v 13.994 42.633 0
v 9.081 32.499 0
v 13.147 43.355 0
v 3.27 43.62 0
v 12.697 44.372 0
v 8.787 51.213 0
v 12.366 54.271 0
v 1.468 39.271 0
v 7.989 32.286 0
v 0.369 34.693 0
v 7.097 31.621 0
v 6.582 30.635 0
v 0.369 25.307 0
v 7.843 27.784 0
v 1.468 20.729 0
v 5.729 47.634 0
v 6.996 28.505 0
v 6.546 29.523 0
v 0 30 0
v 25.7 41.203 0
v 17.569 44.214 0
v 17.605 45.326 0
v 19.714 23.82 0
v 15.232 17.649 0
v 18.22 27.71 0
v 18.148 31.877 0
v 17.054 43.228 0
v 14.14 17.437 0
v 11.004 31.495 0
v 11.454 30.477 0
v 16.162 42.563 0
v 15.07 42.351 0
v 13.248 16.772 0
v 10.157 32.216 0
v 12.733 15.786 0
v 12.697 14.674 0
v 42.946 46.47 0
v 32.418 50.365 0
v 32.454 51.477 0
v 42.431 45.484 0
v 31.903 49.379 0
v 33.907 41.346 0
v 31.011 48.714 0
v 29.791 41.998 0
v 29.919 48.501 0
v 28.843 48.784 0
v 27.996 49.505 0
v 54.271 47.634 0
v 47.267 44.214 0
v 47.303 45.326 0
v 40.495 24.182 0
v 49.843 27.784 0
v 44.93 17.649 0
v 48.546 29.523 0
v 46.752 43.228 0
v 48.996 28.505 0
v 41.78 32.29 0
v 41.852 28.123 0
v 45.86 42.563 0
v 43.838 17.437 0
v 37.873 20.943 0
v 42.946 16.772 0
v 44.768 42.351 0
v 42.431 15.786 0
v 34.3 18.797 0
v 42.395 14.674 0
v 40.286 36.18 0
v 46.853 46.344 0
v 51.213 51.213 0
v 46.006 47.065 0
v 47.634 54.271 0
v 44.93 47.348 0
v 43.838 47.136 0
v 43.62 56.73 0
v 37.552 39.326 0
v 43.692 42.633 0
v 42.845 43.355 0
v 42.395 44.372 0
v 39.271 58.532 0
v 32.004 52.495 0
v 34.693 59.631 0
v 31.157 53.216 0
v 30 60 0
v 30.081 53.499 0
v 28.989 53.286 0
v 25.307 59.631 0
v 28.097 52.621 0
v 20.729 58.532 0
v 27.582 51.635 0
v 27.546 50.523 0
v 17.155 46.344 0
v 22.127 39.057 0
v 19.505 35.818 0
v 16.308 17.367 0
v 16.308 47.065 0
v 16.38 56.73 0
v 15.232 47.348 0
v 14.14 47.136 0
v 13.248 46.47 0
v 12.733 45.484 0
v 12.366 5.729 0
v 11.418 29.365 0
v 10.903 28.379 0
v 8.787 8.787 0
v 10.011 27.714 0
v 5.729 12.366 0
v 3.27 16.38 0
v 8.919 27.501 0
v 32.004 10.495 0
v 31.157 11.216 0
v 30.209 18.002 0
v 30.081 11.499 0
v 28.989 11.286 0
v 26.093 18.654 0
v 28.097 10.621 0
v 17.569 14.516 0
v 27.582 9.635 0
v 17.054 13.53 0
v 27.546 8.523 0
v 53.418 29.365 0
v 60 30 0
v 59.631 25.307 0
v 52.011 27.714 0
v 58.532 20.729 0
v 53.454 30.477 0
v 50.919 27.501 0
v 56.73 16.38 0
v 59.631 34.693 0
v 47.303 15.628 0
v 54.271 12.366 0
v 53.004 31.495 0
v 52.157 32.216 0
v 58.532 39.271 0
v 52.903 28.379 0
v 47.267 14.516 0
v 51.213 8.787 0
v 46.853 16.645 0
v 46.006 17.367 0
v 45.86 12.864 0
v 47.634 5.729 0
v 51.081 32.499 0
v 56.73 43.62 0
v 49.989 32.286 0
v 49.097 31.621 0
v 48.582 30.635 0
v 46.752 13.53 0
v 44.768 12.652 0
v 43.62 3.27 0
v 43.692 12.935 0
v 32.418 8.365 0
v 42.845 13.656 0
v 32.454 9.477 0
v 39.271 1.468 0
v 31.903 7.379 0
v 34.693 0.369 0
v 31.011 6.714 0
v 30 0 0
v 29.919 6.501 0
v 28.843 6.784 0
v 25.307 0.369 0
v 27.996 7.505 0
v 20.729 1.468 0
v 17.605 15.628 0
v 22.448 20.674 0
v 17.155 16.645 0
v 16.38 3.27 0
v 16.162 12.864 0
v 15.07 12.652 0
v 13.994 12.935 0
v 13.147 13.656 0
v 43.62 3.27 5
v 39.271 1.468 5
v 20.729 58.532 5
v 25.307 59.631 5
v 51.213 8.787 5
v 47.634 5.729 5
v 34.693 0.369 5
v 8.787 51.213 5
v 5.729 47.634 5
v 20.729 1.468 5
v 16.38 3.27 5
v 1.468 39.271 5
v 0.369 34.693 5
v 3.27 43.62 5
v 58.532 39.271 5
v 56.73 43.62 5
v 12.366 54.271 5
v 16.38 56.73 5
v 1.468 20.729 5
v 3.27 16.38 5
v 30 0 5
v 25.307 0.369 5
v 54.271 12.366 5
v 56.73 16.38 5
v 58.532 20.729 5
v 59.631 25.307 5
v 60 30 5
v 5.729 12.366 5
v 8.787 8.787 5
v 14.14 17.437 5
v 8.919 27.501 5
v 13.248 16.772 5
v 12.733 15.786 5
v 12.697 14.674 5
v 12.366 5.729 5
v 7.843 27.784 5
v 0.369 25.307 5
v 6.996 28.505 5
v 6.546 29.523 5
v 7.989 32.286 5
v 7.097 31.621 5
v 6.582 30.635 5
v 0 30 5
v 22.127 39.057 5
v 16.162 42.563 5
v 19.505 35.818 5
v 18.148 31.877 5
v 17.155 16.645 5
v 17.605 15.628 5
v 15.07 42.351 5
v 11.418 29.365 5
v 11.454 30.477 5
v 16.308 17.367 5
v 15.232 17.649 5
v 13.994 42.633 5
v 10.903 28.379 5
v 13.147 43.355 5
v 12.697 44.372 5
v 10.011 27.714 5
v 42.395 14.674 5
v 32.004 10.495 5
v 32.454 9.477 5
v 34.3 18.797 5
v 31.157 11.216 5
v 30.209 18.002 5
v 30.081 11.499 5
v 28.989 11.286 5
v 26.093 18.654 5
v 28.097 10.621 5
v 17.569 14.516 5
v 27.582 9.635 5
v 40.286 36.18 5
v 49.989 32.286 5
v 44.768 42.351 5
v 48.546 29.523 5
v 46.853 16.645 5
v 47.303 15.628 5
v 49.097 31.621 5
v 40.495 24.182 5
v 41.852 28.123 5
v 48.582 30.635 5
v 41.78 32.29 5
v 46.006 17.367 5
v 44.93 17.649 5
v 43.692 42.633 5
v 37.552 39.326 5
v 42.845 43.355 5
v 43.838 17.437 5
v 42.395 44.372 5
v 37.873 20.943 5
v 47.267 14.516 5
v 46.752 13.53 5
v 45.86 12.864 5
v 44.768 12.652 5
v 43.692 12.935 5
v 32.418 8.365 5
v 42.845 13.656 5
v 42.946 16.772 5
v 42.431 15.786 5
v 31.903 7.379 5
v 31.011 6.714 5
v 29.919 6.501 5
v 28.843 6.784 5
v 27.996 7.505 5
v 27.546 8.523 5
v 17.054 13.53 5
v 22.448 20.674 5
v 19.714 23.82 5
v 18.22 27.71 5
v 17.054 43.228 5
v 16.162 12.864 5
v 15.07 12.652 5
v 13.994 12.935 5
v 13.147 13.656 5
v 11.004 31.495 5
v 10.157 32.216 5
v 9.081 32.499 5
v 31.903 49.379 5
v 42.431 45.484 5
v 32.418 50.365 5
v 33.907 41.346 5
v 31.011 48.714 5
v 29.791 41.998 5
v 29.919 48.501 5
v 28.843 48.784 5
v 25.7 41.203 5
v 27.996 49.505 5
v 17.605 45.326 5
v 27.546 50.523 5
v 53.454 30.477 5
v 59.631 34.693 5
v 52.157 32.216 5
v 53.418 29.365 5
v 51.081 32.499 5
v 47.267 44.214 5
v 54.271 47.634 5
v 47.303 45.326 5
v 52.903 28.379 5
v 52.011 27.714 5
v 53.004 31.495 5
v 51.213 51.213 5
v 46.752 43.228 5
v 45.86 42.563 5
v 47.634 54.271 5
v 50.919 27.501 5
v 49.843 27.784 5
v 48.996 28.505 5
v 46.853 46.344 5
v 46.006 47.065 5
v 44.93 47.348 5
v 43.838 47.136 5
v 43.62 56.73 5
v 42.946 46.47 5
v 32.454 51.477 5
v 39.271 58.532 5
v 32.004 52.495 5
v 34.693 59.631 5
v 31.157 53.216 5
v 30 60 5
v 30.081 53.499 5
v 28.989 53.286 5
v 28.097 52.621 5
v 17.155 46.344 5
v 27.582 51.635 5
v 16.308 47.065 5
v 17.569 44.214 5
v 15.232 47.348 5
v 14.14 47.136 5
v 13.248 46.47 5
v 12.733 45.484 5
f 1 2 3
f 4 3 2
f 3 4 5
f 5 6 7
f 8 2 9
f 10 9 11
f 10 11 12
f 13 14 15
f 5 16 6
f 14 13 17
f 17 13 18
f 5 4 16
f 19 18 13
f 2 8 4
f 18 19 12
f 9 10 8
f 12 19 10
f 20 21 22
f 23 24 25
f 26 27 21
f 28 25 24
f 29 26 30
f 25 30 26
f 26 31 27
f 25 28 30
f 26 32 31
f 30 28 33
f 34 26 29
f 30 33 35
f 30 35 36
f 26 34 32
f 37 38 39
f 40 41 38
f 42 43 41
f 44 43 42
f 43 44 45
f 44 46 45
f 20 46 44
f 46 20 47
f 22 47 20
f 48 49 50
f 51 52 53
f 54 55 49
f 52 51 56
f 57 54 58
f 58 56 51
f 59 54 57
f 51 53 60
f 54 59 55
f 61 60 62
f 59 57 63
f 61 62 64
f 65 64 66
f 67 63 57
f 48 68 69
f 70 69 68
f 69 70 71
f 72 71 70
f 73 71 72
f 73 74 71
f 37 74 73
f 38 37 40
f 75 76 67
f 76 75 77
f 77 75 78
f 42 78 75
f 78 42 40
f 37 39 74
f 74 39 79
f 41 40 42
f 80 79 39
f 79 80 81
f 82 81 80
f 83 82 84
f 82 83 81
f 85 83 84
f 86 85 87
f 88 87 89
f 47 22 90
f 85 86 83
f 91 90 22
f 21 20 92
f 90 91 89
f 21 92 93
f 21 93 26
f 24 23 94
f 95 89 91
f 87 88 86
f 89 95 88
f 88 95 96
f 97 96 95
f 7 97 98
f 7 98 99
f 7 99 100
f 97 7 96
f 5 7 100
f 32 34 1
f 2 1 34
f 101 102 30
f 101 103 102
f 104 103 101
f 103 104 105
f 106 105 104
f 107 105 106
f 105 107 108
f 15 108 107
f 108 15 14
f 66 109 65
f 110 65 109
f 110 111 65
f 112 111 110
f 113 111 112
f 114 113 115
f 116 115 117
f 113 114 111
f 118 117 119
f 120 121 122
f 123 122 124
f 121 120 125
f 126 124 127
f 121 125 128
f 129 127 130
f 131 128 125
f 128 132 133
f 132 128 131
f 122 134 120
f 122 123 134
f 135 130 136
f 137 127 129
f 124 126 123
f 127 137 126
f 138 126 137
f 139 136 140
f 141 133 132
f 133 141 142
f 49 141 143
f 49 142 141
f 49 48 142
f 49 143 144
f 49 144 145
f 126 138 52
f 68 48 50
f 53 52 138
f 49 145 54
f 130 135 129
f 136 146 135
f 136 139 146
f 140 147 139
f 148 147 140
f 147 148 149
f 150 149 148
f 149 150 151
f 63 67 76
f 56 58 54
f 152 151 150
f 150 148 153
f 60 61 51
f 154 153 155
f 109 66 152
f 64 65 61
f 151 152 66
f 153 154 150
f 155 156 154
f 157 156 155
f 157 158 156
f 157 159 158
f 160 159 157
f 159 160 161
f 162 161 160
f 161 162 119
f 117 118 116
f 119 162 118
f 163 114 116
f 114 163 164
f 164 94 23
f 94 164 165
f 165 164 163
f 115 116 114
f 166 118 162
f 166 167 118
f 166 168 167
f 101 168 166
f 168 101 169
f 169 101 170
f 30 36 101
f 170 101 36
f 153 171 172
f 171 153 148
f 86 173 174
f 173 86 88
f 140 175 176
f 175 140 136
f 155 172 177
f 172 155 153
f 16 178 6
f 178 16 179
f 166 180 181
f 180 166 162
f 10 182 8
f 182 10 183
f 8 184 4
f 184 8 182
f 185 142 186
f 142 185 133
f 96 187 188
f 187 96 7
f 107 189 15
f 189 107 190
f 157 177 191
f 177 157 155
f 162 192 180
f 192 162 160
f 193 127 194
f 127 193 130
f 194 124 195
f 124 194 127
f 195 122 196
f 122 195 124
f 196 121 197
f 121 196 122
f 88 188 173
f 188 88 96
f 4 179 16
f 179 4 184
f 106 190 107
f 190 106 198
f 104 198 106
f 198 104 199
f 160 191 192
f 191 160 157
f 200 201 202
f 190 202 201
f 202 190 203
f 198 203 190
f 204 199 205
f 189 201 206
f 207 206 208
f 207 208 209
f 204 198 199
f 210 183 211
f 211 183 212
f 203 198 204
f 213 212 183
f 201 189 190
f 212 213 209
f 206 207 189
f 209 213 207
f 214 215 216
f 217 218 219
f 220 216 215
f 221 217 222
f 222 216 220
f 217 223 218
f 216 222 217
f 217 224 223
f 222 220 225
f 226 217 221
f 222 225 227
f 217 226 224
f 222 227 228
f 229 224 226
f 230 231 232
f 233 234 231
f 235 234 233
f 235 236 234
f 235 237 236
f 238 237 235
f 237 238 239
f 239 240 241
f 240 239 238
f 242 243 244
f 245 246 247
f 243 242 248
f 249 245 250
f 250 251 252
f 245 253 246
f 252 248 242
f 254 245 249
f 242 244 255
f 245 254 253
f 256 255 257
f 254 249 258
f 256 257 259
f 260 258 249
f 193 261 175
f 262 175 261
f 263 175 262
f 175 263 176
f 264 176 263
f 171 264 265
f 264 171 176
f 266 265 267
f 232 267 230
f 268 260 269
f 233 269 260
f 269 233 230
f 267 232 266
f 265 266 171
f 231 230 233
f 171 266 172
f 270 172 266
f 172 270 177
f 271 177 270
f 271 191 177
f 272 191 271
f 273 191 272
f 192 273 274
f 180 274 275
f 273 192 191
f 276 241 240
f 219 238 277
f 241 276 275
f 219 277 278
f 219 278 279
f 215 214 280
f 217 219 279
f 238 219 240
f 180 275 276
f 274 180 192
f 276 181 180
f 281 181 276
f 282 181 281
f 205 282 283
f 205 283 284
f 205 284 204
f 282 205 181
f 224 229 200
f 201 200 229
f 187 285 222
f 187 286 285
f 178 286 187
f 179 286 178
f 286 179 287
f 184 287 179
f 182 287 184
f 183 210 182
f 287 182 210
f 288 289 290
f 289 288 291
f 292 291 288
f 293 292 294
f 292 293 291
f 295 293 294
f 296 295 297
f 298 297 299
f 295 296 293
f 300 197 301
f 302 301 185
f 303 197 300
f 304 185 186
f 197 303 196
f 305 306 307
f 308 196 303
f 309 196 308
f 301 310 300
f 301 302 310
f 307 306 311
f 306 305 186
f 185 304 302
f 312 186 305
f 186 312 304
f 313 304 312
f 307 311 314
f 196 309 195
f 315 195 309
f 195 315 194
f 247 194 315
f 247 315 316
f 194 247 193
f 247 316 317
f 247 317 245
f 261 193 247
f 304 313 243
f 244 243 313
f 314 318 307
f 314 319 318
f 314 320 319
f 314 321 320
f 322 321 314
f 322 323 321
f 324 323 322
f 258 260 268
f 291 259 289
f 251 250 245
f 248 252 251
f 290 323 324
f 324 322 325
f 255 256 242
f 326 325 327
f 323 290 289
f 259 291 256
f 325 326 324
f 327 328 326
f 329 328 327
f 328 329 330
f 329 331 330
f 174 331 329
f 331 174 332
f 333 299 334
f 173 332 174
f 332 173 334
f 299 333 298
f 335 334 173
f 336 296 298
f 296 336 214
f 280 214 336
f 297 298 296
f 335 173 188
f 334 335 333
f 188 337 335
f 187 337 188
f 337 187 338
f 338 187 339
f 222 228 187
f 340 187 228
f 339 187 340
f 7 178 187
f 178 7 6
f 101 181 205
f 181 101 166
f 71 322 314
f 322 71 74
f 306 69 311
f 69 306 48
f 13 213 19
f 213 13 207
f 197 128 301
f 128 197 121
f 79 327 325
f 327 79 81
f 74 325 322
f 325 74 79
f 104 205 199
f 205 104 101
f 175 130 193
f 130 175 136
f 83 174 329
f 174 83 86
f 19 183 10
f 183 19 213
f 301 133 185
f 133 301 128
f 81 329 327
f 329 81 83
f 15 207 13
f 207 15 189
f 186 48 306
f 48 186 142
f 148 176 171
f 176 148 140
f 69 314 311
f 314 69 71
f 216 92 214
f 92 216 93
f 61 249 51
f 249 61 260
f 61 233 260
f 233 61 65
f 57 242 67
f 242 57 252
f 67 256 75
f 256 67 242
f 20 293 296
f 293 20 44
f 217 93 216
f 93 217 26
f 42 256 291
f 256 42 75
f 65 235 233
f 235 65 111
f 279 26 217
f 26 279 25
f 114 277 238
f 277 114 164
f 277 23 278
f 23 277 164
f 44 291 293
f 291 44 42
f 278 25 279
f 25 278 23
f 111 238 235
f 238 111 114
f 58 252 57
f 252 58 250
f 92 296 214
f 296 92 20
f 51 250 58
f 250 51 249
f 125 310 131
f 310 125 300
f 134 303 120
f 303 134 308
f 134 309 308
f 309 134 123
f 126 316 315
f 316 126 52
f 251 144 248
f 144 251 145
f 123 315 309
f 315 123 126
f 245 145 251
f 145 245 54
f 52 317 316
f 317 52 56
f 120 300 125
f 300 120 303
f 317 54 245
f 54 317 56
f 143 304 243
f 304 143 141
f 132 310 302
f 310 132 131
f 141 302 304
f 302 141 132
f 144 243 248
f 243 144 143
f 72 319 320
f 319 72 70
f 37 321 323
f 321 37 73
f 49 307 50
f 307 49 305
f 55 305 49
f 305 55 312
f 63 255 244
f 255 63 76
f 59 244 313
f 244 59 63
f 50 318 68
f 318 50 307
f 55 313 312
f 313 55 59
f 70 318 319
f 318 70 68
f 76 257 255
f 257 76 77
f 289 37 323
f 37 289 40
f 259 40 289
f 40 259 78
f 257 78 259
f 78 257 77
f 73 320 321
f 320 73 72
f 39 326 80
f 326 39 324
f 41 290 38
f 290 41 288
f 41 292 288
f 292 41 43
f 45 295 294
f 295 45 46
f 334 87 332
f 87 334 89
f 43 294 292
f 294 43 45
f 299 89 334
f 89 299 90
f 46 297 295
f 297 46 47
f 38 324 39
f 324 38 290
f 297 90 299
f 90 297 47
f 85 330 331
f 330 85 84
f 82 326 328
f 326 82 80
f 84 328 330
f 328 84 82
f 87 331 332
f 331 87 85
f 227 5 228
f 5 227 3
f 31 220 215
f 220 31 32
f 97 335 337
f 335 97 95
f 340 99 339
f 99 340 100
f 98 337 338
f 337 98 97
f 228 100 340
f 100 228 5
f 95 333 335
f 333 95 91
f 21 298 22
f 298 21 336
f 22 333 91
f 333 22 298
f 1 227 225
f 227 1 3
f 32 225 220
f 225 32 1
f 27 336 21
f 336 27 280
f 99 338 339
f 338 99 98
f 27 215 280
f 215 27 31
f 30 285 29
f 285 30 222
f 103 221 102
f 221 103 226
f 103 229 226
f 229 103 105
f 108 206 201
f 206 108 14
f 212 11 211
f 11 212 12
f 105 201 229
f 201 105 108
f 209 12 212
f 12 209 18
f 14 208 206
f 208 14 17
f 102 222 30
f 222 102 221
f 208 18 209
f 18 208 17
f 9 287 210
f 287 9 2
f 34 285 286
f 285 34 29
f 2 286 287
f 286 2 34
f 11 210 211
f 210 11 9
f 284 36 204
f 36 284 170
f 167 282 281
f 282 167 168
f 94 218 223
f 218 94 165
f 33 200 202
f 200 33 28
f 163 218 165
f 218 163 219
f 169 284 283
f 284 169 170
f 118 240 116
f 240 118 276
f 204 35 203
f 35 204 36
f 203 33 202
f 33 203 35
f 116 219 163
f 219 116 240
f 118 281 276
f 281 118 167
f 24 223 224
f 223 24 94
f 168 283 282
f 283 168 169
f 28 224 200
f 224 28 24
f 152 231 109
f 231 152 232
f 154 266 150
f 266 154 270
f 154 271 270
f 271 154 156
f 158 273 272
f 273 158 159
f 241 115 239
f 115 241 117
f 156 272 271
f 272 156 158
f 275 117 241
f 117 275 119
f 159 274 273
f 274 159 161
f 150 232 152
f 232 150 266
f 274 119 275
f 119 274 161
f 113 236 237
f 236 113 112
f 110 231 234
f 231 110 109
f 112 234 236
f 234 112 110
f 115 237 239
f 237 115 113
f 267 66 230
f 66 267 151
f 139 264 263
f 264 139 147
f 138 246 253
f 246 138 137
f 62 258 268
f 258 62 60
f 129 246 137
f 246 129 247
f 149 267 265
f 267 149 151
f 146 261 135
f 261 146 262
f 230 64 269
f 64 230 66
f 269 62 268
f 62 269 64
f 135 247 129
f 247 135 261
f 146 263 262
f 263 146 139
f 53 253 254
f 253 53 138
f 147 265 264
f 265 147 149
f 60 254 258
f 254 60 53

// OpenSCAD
$fn = 32;

// ----------------------------------------------------------------------
// Spacer plate: round flange R30, 8 bolts
// ----------------------------------------------------------------------

// --- parameters (mm) ---
bore_r = 12;              // centre bore radius
bolt_r = 2.5;             // bolt hole radius
plate_t = 5;              // plate thickness, Z (extrusion height)
flange_r = 30;            // flange radius
n_bolt = 8;               // bolt hole count
ring_r = 21;              // bolt circle radius

profile = [[60, 30], [59.631, 34.693], [58.532, 39.271], [56.73, 43.62], [54.271, 47.634], [51.213, 51.213], [47.634, 54.271], [43.62, 56.73], [39.271, 58.532], [34.693, 59.631], [30, 60], [25.307, 59.631], [20.729, 58.532], [16.38, 56.73], [12.366, 54.271], [8.787, 51.213], [5.729, 47.634], [3.27, 43.62], [1.468, 39.271], [0.369, 34.693], [0, 30], [0.369, 25.307], [1.468, 20.729], [3.27, 16.38], [5.729, 12.366], [8.787, 8.787], [12.366, 5.729], [16.38, 3.27], [20.729, 1.468], [25.307, 0.369], [30, 0], [34.693, 0.369], [39.271, 1.468], [43.62, 3.27], [47.634, 5.729], [51.213, 8.787], [54.271, 12.366], [56.73, 16.38], [58.532, 20.729], [59.631, 25.307]];  // primary outline, 40 points, counter clockwise
void_1 = [[41.78, 32.29], [40.286, 36.18], [37.552, 39.326], [33.907, 41.346], [29.791, 41.998], [25.7, 41.203], [22.127, 39.057], [19.505, 35.818], [18.148, 31.877], [18.22, 27.71], [19.714, 23.82], [22.448, 20.674], [26.093, 18.654], [30.209, 18.002], [34.3, 18.797], [37.873, 20.943], [40.495, 24.182], [41.852, 28.123]];  // centre bore, 18 points
void_2 = [[53.454, 30.477], [53.004, 31.495], [52.157, 32.216], [51.081, 32.499], [49.989, 32.286], [49.097, 31.621], [48.582, 30.635], [48.546, 29.523], [48.996, 28.505], [49.843, 27.784], [50.919, 27.501], [52.011, 27.714], [52.903, 28.379], [53.418, 29.365]];  // bolt hole 1, 14 points
void_3 = [[47.303, 45.326], [46.853, 46.344], [46.006, 47.065], [44.93, 47.348], [43.838, 47.136], [42.946, 46.47], [42.431, 45.484], [42.395, 44.372], [42.845, 43.355], [43.692, 42.633], [44.768, 42.351], [45.86, 42.563], [46.752, 43.228], [47.267, 44.214]];  // bolt hole 2, 14 points
void_4 = [[32.454, 51.477], [32.004, 52.495], [31.157, 53.216], [30.081, 53.499], [28.989, 53.286], [28.097, 52.621], [27.582, 51.635], [27.546, 50.523], [27.996, 49.505], [28.843, 48.784], [29.919, 48.501], [31.011, 48.714], [31.903, 49.379], [32.418, 50.365]];  // bolt hole 3, 14 points
void_5 = [[17.605, 45.326], [17.155, 46.344], [16.308, 47.065], [15.232, 47.348], [14.14, 47.136], [13.248, 46.47], [12.733, 45.484], [12.697, 44.372], [13.147, 43.355], [13.994, 42.633], [15.07, 42.351], [16.162, 42.563], [17.054, 43.228], [17.569, 44.214]];  // bolt hole 4, 14 points
void_6 = [[11.454, 30.477], [11.004, 31.495], [10.157, 32.216], [9.081, 32.499], [7.989, 32.286], [7.097, 31.621], [6.582, 30.635], [6.546, 29.523], [6.996, 28.505], [7.843, 27.784], [8.919, 27.501], [10.011, 27.714], [10.903, 28.379], [11.418, 29.365]];  // bolt hole 5, 14 points
void_7 = [[17.605, 15.628], [17.155, 16.645], [16.308, 17.367], [15.232, 17.649], [14.14, 17.437], [13.248, 16.772], [12.733, 15.786], [12.697, 14.674], [13.147, 13.656], [13.994, 12.935], [15.07, 12.652], [16.162, 12.864], [17.054, 13.53], [17.569, 14.516]];  // bolt hole 6, 14 points
void_8 = [[32.454, 9.477], [32.004, 10.495], [31.157, 11.216], [30.081, 11.499], [28.989, 11.286], [28.097, 10.621], [27.582, 9.635], [27.546, 8.523], [27.996, 7.505], [28.843, 6.784], [29.919, 6.501], [31.011, 6.714], [31.903, 7.379], [32.418, 8.365]];  // bolt hole 7, 14 points
void_9 = [[47.303, 15.628], [46.853, 16.645], [46.006, 17.367], [44.93, 17.649], [43.838, 17.437], [42.946, 16.772], [42.431, 15.786], [42.395, 14.674], [42.845, 13.656], [43.692, 12.935], [44.768, 12.652], [45.86, 12.864], [46.752, 13.53], [47.267, 14.516]];  // bolt hole 8, 14 points

// --- the one profile operation ---
difference() {
  linear_extrude(height = plate_t) polygon(points = profile);
  translate([0, 0, -1])
    linear_extrude(height = plate_t + 2) polygon(points = void_1);
  translate([0, 0, -1])
    linear_extrude(height = plate_t + 2) polygon(points = void_2);
  translate([0, 0, -1])
    linear_extrude(height = plate_t + 2) polygon(points = void_3);
  translate([0, 0, -1])
    linear_extrude(height = plate_t + 2) polygon(points = void_4);
  translate([0, 0, -1])
    linear_extrude(height = plate_t + 2) polygon(points = void_5);
  translate([0, 0, -1])
    linear_extrude(height = plate_t + 2) polygon(points = void_6);
  translate([0, 0, -1])
    linear_extrude(height = plate_t + 2) polygon(points = void_7);
  translate([0, 0, -1])
    linear_extrude(height = plate_t + 2) polygon(points = void_8);
  translate([0, 0, -1])
    linear_extrude(height = plate_t + 2) polygon(points = void_9);
}
